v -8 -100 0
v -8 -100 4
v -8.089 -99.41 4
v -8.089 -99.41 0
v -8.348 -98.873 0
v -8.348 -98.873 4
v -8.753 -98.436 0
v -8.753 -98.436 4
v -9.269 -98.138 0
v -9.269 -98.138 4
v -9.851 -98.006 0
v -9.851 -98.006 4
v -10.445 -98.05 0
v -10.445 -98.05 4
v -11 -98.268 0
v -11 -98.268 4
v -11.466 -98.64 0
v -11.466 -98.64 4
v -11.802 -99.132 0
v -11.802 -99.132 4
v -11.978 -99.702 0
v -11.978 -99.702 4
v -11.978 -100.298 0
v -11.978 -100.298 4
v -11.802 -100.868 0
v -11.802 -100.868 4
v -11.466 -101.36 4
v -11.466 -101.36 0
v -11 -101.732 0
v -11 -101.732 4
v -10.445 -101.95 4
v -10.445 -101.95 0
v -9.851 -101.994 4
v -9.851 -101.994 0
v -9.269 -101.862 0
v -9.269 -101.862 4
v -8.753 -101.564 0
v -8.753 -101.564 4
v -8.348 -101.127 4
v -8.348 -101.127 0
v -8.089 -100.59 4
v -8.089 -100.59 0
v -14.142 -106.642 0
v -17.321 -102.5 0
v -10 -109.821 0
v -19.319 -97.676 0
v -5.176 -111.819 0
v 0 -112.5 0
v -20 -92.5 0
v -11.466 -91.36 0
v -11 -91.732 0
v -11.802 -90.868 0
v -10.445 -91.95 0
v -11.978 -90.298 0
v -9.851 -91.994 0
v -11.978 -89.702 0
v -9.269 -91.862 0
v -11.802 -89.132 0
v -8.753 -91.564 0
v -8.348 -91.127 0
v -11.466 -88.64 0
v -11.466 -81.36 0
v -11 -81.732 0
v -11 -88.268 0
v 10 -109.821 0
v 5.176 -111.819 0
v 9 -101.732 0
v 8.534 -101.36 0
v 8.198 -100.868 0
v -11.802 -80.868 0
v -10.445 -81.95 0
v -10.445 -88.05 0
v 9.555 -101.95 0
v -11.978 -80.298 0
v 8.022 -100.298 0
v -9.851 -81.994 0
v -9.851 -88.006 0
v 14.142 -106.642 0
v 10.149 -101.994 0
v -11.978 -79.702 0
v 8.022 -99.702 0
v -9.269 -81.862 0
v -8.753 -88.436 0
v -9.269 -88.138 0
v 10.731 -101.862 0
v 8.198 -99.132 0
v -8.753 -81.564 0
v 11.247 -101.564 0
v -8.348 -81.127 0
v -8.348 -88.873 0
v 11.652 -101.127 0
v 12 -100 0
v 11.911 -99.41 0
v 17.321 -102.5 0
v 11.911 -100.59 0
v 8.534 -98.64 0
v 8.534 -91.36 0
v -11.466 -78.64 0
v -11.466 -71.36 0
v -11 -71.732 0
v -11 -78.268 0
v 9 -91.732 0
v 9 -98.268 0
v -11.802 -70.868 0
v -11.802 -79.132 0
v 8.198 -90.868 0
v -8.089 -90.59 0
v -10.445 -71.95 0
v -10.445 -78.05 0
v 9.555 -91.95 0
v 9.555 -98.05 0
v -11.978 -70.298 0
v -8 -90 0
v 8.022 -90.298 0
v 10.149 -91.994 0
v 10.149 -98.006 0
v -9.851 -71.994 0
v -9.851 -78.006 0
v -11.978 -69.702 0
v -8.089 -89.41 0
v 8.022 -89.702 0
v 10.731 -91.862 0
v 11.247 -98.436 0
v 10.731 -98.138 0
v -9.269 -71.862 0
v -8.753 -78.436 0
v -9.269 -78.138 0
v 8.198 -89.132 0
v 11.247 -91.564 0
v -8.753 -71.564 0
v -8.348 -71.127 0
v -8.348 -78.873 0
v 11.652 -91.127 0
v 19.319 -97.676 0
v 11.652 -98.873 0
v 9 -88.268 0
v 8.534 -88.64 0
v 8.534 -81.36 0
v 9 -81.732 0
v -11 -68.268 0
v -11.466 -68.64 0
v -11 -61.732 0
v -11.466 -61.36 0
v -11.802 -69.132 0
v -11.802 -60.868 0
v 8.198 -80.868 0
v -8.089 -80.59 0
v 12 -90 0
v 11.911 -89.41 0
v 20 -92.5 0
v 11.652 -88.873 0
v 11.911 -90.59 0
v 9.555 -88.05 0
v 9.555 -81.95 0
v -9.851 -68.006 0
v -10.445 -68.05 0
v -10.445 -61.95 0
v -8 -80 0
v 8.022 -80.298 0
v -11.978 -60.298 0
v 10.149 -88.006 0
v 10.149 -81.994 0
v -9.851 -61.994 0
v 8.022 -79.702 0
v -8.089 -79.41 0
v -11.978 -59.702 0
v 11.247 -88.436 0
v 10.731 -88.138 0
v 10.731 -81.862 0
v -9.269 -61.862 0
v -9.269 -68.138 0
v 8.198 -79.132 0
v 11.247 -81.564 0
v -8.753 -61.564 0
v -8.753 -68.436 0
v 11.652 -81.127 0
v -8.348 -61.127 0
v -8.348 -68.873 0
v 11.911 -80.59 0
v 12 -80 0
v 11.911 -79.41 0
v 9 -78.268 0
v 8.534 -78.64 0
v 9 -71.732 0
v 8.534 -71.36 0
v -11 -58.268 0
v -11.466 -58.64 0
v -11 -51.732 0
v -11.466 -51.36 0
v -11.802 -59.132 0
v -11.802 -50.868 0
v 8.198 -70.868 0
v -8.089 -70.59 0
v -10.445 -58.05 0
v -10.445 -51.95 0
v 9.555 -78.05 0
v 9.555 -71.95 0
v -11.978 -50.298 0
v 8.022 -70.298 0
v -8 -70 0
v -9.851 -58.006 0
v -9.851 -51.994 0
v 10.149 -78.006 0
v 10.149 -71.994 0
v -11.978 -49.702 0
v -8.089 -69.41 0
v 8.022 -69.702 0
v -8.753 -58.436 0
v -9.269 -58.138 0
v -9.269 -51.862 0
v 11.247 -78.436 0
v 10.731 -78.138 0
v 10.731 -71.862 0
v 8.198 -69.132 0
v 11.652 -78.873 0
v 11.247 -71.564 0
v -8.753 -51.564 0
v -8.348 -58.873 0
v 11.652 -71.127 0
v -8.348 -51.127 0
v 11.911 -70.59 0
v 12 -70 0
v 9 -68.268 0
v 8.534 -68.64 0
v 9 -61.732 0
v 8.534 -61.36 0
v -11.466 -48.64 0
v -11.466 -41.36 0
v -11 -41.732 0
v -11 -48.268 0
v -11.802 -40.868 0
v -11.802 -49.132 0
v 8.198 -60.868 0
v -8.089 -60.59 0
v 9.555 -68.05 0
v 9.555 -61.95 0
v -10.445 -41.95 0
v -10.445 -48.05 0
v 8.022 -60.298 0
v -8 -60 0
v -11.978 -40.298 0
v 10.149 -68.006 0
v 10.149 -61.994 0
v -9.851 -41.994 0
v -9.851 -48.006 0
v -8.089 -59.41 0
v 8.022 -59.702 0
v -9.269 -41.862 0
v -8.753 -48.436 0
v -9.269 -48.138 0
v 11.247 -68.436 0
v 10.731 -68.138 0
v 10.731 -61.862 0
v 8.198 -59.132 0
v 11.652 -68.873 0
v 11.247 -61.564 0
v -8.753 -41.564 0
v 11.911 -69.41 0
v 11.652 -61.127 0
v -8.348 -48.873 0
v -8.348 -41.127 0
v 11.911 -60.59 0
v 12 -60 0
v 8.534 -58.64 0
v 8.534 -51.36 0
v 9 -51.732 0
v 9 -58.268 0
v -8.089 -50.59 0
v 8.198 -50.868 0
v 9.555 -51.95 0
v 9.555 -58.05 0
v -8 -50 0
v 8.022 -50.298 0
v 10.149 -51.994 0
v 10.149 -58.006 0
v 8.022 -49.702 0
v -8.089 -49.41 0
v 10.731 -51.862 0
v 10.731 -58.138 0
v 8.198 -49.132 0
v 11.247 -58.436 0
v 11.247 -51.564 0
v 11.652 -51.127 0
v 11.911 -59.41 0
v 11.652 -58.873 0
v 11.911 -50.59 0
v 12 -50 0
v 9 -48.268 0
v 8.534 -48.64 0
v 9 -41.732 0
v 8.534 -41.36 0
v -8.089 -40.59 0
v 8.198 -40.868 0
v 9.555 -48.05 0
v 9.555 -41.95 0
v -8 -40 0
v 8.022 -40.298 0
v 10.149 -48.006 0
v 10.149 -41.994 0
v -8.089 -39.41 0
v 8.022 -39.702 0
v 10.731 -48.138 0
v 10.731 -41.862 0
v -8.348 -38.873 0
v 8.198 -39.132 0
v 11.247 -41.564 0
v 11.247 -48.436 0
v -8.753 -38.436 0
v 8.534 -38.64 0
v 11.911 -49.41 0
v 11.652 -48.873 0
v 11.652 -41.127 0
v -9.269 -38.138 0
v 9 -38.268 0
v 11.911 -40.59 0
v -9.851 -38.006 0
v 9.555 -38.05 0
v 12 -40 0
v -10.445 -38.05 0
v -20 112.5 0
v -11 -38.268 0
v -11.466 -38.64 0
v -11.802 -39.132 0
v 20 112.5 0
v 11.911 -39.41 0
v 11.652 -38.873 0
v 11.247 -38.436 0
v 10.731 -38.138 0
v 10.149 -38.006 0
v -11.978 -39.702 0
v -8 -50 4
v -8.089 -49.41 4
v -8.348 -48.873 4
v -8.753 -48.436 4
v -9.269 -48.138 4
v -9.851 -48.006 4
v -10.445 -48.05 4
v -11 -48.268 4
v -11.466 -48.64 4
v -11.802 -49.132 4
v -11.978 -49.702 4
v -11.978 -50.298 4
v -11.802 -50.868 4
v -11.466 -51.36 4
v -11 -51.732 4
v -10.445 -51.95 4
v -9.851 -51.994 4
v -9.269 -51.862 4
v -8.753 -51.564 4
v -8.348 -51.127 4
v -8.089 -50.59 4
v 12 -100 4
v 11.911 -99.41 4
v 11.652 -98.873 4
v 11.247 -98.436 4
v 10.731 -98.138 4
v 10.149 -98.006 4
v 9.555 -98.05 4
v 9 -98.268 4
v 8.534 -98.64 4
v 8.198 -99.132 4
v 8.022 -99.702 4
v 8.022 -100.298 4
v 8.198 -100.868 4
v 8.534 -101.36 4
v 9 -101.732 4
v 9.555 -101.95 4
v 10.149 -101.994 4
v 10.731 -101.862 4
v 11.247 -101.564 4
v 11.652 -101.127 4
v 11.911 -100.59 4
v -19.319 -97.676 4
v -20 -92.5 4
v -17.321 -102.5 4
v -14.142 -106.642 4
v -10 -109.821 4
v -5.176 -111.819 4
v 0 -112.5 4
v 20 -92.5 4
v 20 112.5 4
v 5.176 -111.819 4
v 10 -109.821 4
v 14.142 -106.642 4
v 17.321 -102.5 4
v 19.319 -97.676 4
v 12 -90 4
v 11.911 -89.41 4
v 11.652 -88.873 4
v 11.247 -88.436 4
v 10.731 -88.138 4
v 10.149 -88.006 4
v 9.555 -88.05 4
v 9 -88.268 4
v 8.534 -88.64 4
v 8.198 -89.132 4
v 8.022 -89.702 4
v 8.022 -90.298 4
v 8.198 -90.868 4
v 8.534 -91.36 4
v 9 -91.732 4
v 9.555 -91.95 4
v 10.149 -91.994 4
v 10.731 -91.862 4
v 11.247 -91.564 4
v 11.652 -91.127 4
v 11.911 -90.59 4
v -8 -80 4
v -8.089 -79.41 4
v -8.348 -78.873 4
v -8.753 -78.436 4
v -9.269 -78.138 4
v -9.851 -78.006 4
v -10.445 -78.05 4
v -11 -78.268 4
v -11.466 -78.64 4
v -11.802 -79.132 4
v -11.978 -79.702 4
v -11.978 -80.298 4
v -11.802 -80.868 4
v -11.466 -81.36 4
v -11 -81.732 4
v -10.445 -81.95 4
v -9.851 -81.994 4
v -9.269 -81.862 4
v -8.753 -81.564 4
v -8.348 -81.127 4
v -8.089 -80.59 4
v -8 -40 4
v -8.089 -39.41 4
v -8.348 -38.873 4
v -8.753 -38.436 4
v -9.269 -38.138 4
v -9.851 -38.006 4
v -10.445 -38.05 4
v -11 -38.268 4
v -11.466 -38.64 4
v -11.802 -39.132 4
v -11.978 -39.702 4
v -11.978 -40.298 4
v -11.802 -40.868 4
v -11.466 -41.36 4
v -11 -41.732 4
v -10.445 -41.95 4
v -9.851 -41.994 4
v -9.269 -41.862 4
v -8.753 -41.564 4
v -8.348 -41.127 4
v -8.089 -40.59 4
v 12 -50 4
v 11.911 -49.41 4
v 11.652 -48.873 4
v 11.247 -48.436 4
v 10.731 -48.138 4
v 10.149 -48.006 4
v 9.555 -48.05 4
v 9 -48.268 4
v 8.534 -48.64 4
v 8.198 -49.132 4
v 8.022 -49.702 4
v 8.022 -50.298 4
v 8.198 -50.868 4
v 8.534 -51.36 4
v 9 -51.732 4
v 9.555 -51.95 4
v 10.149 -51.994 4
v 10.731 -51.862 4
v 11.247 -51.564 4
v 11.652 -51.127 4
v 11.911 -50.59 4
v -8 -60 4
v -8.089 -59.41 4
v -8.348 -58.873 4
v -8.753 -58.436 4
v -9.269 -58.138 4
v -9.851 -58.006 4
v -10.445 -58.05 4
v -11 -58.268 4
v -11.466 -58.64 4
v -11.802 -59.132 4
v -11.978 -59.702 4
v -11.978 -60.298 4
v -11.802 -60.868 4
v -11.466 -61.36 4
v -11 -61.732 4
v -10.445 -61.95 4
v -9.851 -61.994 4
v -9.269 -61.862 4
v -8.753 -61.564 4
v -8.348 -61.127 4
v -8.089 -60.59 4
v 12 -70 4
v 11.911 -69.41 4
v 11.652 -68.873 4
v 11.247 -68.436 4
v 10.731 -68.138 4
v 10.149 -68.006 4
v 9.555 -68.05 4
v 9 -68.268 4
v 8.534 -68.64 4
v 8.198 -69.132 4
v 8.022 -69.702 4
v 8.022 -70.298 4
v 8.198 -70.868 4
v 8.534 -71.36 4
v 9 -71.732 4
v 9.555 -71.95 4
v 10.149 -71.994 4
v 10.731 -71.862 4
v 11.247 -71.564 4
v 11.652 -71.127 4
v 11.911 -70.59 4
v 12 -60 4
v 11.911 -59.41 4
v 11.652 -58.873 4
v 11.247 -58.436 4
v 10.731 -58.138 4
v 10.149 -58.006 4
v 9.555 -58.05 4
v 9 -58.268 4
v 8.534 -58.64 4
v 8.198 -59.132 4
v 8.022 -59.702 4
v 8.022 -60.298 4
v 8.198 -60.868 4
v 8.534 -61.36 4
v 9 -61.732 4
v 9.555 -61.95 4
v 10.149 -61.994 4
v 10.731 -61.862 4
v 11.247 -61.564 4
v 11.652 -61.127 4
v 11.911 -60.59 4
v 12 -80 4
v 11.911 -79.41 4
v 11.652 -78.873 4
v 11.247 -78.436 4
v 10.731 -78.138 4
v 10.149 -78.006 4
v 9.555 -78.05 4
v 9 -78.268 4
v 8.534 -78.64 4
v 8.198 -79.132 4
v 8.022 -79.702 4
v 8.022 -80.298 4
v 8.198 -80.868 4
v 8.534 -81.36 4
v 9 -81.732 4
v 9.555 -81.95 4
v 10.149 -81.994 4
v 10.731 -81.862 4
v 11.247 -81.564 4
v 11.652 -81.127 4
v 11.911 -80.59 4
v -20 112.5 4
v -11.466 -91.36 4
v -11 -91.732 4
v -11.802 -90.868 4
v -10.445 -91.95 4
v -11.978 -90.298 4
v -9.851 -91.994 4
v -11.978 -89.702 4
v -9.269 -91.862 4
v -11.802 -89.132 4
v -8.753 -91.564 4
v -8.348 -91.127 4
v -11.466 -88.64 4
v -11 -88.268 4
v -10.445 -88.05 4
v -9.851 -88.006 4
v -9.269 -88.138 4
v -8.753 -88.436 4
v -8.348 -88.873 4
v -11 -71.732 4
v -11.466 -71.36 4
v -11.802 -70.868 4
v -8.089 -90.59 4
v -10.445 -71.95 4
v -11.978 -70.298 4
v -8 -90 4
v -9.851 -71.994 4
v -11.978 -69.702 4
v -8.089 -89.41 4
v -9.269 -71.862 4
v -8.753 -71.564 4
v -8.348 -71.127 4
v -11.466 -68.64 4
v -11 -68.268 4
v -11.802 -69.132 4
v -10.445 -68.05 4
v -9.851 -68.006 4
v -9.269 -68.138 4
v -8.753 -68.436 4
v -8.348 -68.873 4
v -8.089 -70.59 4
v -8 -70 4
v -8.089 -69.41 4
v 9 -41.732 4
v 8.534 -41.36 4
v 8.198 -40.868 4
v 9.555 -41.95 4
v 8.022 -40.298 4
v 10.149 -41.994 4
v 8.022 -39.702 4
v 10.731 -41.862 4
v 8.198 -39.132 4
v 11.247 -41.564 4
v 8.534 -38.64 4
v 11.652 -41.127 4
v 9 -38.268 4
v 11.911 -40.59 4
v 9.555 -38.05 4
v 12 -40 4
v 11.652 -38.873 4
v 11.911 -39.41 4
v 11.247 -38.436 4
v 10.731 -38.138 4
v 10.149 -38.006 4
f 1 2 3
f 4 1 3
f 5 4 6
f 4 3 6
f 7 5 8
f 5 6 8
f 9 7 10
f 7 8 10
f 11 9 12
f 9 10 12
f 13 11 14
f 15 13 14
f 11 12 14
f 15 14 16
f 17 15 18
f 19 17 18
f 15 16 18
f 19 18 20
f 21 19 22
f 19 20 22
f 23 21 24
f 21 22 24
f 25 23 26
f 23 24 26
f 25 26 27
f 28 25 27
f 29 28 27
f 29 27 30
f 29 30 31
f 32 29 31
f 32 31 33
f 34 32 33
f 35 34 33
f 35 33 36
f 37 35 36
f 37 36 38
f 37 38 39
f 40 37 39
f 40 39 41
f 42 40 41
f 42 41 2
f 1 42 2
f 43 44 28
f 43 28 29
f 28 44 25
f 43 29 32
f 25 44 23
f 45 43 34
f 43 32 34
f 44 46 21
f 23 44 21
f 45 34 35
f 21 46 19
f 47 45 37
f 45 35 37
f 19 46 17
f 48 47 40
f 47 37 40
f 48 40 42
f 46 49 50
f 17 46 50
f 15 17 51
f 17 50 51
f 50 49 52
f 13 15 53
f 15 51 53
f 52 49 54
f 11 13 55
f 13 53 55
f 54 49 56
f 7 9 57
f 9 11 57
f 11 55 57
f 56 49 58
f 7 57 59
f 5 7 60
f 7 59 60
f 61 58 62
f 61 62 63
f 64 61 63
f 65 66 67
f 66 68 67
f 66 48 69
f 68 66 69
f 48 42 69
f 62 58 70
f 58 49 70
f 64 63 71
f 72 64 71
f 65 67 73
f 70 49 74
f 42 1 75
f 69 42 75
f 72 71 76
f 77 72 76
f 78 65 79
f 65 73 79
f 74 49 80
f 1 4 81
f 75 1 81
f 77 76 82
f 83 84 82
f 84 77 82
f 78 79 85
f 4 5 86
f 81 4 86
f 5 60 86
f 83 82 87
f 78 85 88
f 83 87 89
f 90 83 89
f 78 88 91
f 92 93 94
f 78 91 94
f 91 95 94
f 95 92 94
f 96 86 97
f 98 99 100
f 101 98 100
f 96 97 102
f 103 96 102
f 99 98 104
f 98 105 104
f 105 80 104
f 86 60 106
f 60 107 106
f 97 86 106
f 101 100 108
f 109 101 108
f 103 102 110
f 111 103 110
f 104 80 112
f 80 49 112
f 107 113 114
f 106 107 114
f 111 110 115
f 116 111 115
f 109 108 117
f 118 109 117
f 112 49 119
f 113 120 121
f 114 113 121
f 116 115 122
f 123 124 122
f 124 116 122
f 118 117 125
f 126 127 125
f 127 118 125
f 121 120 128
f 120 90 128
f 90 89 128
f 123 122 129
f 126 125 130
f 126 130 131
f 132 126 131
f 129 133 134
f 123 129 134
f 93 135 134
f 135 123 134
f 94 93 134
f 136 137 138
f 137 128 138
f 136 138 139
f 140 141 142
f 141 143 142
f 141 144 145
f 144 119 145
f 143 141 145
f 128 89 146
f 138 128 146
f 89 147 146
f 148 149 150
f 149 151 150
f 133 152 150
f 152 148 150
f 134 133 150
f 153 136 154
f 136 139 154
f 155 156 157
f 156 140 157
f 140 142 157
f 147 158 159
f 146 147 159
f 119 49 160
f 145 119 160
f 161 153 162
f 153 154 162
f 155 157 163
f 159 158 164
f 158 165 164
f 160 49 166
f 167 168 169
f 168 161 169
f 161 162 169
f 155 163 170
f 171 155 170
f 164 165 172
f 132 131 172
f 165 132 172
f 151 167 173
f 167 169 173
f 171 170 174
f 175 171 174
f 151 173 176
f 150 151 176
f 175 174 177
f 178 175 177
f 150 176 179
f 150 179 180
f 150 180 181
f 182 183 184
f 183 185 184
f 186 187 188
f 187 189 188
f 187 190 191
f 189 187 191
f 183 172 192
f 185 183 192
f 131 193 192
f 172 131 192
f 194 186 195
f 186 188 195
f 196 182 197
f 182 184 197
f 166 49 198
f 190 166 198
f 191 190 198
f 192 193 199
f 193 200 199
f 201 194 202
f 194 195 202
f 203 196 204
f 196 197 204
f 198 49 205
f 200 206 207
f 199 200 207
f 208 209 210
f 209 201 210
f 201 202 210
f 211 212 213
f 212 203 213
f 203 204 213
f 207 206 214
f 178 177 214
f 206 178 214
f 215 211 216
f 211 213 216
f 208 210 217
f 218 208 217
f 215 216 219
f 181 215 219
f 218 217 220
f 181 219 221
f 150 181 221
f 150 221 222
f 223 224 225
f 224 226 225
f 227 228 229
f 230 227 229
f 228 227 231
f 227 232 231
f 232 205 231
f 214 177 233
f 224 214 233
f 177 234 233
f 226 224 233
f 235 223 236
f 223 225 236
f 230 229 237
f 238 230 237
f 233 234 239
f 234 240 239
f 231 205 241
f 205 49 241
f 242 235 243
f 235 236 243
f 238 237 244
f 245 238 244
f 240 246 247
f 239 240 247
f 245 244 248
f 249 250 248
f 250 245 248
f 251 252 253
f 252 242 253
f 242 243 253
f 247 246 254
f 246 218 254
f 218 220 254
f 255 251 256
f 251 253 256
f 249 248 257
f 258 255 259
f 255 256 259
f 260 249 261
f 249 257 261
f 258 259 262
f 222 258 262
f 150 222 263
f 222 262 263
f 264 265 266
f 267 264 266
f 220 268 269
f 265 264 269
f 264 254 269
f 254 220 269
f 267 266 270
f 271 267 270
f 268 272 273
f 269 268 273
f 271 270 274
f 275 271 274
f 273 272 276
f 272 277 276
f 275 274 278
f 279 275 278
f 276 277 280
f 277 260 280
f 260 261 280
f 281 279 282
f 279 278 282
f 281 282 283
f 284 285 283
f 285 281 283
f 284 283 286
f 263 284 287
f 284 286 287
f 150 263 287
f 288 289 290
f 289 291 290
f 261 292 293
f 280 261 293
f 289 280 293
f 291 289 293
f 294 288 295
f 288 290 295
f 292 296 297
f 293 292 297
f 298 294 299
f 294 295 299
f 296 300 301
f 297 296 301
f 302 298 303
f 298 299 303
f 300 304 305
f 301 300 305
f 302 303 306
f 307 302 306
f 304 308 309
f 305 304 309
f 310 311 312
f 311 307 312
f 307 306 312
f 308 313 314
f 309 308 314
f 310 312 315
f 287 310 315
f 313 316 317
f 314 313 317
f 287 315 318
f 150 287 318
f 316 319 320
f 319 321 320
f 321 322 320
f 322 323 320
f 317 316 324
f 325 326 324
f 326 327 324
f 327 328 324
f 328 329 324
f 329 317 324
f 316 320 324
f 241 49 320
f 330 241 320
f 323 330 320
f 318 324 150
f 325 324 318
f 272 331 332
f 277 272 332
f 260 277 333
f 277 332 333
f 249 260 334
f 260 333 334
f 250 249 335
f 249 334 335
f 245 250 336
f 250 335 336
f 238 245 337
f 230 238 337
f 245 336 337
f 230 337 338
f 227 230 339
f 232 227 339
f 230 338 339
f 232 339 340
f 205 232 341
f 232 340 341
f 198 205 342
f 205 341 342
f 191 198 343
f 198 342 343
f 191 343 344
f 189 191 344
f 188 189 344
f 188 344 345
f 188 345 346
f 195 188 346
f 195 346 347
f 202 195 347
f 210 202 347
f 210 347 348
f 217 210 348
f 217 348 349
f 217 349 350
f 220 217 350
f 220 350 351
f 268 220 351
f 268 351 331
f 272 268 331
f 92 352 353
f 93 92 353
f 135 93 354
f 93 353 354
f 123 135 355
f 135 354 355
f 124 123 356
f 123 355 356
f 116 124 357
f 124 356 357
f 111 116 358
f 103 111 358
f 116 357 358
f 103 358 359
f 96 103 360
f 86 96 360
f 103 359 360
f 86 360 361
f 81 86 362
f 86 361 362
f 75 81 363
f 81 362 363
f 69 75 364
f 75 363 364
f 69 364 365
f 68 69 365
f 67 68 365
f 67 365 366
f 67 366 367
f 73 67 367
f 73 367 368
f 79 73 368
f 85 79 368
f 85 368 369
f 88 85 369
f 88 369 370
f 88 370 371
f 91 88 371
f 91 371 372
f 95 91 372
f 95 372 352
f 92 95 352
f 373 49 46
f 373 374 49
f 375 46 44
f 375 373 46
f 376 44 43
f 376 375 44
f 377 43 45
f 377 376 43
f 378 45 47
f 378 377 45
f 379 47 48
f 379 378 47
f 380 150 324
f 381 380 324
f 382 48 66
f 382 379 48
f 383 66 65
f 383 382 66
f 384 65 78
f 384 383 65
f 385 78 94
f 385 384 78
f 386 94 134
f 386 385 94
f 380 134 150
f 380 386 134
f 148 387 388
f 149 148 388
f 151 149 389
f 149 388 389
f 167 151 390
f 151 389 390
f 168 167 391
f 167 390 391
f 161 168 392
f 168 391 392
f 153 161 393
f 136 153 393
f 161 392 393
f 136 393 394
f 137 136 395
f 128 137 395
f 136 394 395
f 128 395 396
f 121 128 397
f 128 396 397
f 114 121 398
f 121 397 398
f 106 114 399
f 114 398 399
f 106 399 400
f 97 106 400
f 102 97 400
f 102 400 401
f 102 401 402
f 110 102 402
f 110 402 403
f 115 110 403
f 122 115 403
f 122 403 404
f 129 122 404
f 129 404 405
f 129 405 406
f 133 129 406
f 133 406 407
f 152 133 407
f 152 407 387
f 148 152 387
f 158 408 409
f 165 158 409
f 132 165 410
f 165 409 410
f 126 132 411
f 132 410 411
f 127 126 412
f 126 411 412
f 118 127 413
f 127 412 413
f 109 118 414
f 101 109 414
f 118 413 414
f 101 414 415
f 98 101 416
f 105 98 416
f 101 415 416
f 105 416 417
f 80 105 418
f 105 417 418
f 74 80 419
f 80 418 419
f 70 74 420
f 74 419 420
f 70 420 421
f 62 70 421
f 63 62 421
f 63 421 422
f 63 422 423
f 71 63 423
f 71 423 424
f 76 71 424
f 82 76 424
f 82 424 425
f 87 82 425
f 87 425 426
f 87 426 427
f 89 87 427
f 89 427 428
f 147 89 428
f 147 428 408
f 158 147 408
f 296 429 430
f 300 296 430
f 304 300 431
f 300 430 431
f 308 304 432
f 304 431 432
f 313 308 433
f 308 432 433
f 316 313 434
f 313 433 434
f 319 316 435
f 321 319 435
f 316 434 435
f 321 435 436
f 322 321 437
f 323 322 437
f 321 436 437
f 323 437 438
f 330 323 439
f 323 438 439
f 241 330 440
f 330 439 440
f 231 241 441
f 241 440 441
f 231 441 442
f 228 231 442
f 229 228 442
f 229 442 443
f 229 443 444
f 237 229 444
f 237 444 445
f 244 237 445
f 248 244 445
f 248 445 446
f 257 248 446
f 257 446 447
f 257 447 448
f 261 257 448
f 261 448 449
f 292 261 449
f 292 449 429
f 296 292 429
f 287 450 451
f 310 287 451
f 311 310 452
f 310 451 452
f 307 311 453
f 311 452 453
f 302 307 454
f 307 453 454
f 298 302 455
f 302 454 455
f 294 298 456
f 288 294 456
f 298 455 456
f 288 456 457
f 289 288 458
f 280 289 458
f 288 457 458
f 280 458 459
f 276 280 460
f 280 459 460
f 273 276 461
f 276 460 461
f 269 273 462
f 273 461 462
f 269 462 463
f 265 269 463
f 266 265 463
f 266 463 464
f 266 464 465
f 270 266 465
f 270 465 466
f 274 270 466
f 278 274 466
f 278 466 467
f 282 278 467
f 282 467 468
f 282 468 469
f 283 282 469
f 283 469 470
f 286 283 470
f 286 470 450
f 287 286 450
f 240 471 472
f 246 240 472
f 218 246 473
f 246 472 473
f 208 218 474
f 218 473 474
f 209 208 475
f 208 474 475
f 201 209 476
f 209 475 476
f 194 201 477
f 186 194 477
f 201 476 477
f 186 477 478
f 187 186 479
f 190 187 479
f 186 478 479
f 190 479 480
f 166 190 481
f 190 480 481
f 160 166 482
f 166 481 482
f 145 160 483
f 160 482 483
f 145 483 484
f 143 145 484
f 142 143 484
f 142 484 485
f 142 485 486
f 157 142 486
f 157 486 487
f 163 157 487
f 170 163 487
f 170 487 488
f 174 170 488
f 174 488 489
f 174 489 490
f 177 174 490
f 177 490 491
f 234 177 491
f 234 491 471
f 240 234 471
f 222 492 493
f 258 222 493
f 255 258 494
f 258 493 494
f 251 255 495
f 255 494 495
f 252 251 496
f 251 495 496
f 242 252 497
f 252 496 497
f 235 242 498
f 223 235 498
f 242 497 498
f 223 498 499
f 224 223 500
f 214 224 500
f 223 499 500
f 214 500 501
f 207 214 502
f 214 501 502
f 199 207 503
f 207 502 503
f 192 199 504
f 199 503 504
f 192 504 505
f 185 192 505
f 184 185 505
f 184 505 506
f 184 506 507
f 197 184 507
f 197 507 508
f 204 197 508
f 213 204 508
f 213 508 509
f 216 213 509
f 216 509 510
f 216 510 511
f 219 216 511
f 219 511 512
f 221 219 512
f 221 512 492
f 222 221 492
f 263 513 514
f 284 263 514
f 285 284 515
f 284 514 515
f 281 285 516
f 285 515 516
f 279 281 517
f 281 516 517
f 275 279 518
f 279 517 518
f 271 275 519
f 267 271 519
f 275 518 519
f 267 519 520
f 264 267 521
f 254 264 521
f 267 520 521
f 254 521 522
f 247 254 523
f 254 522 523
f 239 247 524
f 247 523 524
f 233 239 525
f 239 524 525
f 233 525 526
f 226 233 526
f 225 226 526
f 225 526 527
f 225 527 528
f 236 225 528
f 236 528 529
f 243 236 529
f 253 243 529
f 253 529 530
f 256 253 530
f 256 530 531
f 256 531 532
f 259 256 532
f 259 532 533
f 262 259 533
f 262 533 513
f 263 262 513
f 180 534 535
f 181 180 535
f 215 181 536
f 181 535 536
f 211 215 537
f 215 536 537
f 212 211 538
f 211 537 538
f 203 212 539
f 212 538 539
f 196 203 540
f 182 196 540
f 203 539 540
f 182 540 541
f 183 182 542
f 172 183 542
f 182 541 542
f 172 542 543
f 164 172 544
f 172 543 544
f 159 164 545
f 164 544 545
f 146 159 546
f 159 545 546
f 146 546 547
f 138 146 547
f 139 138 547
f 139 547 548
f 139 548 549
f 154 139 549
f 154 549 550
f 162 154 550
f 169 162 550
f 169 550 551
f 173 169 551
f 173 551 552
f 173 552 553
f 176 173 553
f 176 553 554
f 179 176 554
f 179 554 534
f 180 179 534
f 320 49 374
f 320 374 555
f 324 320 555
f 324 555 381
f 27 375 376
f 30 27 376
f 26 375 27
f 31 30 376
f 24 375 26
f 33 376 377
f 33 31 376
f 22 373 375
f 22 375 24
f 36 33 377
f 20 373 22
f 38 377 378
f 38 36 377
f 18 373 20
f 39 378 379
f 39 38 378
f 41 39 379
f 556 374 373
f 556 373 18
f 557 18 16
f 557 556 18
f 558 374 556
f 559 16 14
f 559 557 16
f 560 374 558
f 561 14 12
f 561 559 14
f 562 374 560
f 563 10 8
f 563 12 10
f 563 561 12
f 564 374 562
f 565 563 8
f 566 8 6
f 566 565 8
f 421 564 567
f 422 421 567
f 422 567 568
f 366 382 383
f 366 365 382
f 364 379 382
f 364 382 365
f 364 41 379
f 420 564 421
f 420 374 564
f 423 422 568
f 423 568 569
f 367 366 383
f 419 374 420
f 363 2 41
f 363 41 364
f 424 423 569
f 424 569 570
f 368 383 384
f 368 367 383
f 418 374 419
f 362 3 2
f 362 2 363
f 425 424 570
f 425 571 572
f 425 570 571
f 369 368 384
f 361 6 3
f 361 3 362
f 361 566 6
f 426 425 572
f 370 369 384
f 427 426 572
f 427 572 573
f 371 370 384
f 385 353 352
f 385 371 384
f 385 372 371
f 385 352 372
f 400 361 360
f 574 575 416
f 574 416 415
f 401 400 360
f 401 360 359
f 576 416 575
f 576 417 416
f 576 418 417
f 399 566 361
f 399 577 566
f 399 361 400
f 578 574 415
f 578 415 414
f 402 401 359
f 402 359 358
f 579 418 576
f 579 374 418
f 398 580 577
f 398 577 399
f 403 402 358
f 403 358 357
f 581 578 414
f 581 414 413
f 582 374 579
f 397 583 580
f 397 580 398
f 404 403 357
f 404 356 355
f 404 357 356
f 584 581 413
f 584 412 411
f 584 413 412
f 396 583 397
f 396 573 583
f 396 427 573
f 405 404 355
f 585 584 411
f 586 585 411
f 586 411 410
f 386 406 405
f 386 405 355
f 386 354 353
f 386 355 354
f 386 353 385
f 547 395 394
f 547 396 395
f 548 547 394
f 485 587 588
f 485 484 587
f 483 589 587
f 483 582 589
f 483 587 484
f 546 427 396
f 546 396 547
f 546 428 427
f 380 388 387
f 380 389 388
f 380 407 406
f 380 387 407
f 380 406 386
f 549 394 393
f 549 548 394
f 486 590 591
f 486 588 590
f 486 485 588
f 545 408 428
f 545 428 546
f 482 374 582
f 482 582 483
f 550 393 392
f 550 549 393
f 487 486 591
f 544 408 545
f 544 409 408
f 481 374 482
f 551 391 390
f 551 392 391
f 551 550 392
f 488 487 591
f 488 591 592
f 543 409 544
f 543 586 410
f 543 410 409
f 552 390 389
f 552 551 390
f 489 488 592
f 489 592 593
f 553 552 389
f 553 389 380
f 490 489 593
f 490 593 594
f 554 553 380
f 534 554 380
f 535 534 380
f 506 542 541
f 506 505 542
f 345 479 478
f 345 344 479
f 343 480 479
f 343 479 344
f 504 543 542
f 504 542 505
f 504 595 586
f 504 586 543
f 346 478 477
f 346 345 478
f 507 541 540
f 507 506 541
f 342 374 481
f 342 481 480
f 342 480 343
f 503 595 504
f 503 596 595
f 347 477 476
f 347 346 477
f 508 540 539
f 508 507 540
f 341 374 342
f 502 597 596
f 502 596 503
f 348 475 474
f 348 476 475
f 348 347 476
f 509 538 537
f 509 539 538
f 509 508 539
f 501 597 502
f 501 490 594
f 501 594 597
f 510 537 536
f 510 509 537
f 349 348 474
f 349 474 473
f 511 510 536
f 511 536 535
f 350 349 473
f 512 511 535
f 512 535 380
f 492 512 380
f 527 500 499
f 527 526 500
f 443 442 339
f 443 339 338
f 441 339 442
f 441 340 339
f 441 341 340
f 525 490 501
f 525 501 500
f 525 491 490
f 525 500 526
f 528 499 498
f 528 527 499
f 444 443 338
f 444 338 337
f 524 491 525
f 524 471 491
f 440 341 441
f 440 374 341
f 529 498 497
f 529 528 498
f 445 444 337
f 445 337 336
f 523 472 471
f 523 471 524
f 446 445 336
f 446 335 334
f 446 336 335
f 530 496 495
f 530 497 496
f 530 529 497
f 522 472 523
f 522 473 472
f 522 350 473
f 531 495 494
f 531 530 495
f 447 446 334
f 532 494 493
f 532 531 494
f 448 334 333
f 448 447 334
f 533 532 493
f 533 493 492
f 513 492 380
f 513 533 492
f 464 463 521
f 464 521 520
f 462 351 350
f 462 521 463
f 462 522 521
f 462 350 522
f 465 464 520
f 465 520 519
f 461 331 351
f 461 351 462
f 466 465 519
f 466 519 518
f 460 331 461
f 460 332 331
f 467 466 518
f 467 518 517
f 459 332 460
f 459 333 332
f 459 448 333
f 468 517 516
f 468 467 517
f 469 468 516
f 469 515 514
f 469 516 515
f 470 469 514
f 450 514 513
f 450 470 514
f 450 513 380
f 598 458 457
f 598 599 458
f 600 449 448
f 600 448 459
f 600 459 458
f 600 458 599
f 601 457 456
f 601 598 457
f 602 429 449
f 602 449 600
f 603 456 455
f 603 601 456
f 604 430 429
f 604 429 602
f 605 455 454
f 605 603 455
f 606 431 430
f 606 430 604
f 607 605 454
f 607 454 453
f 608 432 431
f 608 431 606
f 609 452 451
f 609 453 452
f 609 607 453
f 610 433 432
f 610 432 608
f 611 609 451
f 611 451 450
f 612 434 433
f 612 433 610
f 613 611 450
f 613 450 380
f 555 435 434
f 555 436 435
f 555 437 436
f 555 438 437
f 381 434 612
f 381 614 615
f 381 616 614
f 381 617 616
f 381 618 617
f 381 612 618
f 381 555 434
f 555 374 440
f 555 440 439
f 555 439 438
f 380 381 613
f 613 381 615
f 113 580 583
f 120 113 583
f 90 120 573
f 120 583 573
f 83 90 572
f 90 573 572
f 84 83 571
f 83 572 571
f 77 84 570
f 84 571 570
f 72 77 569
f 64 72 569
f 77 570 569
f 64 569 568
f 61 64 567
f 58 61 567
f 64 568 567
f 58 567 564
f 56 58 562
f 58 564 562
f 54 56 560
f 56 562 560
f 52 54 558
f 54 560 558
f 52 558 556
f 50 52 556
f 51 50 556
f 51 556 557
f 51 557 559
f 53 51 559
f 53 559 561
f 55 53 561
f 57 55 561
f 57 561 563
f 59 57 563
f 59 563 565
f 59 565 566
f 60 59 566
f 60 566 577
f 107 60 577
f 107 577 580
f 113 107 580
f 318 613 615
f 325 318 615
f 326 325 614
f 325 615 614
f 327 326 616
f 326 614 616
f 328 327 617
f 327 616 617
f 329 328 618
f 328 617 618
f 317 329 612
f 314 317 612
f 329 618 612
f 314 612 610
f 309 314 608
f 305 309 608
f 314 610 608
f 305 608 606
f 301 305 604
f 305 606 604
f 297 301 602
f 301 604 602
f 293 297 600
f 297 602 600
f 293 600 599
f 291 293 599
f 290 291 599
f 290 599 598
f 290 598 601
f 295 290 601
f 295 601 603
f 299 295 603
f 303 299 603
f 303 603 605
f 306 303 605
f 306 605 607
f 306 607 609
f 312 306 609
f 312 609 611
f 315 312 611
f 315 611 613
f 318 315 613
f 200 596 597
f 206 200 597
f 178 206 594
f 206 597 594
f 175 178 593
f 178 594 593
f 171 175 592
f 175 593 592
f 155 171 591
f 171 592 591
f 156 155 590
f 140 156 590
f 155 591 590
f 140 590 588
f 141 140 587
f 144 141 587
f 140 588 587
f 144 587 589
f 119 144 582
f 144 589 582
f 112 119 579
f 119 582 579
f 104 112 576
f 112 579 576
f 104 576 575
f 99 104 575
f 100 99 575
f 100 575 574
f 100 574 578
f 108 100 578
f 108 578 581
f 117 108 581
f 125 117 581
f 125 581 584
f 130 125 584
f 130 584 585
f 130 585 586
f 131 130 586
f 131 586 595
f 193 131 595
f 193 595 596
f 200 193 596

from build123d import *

# Parameters (mm, degrees)
SKETCH2_W           = 40
SKETCH2_H           = 225
BOSS_EXTRUDE1_DEPTH = 4
SKETCH3_R           = 2
CUT_EXTRUDE1_DEPTH  = 115.333940718
LPATTERN1_COUNT     = 7
LPATTERN1_PITCH     = 10
FILLET2_R           = 20


with BuildPart() as part:
    # Sketch2 → Boss-Extrude1 (new body)
    with BuildSketch(Plane.XY):
        Rectangle(SKETCH2_W, SKETCH2_H)
    extrude(amount=BOSS_EXTRUDE1_DEPTH)

    # Sketch3 → Cut-Extrude1 (cut, through all)
    with BuildSketch(Plane.XY.offset(4)):
        with Locations((-10, -100)):
            Circle(SKETCH3_R)
        with Locations((10, -100)):
            Circle(SKETCH3_R)
    cut_extrude1 = extrude(amount=-CUT_EXTRUDE1_DEPTH, mode=Mode.SUBTRACT)

    # LPattern1: Cut-Extrude1 ×7
    with Locations(*[(0, i * LPATTERN1_PITCH, 0) for i in range(1, LPATTERN1_COUNT)]):
        add(cut_extrude1, mode=Mode.SUBTRACT)

    # Fillet2
    fillet2_edges = [part.edges().sort_by_distance(p)[0] for p in [
        (20, -112.5, 2),
        (-20, -112.5, 2),
    ]]
    fillet(fillet2_edges, radius=FILLET2_R - 0.0001)  # a hair under: the kernel refuses the full size


solid = part.part
